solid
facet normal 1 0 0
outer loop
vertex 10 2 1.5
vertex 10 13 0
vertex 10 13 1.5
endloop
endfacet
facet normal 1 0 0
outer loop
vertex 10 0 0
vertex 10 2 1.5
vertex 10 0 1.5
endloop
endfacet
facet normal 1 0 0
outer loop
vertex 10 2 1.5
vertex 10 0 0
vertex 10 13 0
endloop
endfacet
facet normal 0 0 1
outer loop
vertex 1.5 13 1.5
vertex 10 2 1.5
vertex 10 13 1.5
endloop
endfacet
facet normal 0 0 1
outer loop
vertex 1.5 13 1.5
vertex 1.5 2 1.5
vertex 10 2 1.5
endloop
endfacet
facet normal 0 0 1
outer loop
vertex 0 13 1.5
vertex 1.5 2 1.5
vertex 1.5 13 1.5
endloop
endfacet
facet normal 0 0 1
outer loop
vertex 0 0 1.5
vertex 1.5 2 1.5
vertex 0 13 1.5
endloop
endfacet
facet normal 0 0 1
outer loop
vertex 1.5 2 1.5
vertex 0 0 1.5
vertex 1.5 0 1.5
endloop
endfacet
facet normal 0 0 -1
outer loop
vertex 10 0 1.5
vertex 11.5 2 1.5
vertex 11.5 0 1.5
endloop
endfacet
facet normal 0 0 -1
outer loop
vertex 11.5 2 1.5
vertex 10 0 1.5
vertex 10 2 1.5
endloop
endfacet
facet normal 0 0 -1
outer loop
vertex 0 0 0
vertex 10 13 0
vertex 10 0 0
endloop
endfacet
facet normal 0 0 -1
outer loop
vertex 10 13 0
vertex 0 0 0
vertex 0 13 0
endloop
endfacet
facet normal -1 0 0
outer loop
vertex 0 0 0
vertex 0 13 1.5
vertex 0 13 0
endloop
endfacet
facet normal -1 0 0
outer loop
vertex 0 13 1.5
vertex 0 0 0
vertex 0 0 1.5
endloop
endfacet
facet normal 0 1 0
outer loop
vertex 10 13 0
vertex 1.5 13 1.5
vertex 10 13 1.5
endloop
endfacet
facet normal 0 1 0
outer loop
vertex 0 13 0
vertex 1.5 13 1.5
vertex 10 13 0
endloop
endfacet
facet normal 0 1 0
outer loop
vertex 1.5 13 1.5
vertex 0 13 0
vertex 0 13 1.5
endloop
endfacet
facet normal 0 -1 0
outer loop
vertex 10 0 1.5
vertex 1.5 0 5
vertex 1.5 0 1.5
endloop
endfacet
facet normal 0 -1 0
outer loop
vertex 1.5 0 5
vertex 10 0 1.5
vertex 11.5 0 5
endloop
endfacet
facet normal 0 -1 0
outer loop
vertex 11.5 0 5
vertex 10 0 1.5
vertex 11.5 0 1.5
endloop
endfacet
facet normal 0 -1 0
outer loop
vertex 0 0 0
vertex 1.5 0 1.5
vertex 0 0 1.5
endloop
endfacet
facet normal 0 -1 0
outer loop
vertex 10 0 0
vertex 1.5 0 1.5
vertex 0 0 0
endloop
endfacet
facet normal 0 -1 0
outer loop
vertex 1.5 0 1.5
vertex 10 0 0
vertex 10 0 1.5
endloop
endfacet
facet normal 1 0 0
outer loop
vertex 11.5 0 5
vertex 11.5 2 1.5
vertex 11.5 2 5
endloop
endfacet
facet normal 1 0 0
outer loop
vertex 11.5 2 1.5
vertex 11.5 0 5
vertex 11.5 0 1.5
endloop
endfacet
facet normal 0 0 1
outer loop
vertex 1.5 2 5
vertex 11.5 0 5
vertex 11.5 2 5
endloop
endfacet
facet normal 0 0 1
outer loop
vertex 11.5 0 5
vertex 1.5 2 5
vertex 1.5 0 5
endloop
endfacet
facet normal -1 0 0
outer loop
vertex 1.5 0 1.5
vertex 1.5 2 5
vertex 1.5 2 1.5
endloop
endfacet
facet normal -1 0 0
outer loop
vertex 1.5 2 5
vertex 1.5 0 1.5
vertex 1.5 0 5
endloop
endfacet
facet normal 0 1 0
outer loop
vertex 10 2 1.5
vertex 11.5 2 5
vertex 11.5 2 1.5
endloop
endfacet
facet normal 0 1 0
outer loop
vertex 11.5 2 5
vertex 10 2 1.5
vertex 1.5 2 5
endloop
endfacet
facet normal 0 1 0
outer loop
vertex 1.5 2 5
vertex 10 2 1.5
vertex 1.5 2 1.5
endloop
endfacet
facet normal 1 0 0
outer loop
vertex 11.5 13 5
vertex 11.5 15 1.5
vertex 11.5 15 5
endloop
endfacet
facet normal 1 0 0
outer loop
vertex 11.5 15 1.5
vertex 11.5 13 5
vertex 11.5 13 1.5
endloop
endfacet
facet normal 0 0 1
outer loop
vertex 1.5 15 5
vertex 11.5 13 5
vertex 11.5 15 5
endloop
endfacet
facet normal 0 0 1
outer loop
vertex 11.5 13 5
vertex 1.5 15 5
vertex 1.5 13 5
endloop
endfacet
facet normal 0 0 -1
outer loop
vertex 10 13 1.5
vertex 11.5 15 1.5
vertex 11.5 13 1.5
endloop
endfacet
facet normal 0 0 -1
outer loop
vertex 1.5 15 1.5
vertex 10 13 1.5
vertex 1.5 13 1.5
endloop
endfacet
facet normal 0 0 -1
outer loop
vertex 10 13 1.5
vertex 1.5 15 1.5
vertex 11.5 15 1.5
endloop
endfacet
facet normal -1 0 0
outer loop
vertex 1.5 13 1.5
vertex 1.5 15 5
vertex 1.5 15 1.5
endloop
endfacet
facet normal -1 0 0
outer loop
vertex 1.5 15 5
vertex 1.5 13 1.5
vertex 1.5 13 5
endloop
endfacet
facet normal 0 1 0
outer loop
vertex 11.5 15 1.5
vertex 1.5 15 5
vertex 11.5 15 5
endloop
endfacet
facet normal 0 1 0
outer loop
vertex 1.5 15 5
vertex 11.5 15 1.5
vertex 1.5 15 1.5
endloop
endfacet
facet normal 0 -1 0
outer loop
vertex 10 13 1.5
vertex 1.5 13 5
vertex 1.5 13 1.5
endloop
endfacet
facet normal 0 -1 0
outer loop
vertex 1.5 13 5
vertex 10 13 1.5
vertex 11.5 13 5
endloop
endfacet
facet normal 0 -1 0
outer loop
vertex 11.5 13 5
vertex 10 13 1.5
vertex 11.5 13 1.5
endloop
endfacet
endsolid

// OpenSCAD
// LED Strip Clip for OpenSCAD

// Parameters
led_width = 10;        // Width of the LED strip (mm)
led_thickness = 2;      // Thickness of the LED strip (mm)
clip_height = 2;        // Height of the clip above the surface (mm)
clip_grip_depth = 1.5;  // How much the clip grips the LED strip (mm)
wall_thickness = 1.5;   // Wall thickness of the clip (mm)

// Base platform (surface mounting)
module base() {
    cube([led_width, led_width + (2 * wall_thickness), wall_thickness], center=false);
}

// Clip arm that holds the LED strip
module clip_arm() {
    // translate([wall_thickness, 0, wall_thickness])
    cube([led_width, clip_height, led_thickness + clip_grip_depth]);
}

// Full assembly
union() {
    base();
    
    translate([wall_thickness, 0, wall_thickness])
    clip_arm();

    translate([wall_thickness, led_width + (wall_thickness * 2), wall_thickness])
    clip_arm();


    // Optional: Add a mounting hole
    //translate([led_width/2 + wall_thickness, 10, wall_thickness/2])
    //rotate([90, 0, 0])
    //cylinder(h = wall_thickness, r = 1.5, center=false); // Mounting hole
}
